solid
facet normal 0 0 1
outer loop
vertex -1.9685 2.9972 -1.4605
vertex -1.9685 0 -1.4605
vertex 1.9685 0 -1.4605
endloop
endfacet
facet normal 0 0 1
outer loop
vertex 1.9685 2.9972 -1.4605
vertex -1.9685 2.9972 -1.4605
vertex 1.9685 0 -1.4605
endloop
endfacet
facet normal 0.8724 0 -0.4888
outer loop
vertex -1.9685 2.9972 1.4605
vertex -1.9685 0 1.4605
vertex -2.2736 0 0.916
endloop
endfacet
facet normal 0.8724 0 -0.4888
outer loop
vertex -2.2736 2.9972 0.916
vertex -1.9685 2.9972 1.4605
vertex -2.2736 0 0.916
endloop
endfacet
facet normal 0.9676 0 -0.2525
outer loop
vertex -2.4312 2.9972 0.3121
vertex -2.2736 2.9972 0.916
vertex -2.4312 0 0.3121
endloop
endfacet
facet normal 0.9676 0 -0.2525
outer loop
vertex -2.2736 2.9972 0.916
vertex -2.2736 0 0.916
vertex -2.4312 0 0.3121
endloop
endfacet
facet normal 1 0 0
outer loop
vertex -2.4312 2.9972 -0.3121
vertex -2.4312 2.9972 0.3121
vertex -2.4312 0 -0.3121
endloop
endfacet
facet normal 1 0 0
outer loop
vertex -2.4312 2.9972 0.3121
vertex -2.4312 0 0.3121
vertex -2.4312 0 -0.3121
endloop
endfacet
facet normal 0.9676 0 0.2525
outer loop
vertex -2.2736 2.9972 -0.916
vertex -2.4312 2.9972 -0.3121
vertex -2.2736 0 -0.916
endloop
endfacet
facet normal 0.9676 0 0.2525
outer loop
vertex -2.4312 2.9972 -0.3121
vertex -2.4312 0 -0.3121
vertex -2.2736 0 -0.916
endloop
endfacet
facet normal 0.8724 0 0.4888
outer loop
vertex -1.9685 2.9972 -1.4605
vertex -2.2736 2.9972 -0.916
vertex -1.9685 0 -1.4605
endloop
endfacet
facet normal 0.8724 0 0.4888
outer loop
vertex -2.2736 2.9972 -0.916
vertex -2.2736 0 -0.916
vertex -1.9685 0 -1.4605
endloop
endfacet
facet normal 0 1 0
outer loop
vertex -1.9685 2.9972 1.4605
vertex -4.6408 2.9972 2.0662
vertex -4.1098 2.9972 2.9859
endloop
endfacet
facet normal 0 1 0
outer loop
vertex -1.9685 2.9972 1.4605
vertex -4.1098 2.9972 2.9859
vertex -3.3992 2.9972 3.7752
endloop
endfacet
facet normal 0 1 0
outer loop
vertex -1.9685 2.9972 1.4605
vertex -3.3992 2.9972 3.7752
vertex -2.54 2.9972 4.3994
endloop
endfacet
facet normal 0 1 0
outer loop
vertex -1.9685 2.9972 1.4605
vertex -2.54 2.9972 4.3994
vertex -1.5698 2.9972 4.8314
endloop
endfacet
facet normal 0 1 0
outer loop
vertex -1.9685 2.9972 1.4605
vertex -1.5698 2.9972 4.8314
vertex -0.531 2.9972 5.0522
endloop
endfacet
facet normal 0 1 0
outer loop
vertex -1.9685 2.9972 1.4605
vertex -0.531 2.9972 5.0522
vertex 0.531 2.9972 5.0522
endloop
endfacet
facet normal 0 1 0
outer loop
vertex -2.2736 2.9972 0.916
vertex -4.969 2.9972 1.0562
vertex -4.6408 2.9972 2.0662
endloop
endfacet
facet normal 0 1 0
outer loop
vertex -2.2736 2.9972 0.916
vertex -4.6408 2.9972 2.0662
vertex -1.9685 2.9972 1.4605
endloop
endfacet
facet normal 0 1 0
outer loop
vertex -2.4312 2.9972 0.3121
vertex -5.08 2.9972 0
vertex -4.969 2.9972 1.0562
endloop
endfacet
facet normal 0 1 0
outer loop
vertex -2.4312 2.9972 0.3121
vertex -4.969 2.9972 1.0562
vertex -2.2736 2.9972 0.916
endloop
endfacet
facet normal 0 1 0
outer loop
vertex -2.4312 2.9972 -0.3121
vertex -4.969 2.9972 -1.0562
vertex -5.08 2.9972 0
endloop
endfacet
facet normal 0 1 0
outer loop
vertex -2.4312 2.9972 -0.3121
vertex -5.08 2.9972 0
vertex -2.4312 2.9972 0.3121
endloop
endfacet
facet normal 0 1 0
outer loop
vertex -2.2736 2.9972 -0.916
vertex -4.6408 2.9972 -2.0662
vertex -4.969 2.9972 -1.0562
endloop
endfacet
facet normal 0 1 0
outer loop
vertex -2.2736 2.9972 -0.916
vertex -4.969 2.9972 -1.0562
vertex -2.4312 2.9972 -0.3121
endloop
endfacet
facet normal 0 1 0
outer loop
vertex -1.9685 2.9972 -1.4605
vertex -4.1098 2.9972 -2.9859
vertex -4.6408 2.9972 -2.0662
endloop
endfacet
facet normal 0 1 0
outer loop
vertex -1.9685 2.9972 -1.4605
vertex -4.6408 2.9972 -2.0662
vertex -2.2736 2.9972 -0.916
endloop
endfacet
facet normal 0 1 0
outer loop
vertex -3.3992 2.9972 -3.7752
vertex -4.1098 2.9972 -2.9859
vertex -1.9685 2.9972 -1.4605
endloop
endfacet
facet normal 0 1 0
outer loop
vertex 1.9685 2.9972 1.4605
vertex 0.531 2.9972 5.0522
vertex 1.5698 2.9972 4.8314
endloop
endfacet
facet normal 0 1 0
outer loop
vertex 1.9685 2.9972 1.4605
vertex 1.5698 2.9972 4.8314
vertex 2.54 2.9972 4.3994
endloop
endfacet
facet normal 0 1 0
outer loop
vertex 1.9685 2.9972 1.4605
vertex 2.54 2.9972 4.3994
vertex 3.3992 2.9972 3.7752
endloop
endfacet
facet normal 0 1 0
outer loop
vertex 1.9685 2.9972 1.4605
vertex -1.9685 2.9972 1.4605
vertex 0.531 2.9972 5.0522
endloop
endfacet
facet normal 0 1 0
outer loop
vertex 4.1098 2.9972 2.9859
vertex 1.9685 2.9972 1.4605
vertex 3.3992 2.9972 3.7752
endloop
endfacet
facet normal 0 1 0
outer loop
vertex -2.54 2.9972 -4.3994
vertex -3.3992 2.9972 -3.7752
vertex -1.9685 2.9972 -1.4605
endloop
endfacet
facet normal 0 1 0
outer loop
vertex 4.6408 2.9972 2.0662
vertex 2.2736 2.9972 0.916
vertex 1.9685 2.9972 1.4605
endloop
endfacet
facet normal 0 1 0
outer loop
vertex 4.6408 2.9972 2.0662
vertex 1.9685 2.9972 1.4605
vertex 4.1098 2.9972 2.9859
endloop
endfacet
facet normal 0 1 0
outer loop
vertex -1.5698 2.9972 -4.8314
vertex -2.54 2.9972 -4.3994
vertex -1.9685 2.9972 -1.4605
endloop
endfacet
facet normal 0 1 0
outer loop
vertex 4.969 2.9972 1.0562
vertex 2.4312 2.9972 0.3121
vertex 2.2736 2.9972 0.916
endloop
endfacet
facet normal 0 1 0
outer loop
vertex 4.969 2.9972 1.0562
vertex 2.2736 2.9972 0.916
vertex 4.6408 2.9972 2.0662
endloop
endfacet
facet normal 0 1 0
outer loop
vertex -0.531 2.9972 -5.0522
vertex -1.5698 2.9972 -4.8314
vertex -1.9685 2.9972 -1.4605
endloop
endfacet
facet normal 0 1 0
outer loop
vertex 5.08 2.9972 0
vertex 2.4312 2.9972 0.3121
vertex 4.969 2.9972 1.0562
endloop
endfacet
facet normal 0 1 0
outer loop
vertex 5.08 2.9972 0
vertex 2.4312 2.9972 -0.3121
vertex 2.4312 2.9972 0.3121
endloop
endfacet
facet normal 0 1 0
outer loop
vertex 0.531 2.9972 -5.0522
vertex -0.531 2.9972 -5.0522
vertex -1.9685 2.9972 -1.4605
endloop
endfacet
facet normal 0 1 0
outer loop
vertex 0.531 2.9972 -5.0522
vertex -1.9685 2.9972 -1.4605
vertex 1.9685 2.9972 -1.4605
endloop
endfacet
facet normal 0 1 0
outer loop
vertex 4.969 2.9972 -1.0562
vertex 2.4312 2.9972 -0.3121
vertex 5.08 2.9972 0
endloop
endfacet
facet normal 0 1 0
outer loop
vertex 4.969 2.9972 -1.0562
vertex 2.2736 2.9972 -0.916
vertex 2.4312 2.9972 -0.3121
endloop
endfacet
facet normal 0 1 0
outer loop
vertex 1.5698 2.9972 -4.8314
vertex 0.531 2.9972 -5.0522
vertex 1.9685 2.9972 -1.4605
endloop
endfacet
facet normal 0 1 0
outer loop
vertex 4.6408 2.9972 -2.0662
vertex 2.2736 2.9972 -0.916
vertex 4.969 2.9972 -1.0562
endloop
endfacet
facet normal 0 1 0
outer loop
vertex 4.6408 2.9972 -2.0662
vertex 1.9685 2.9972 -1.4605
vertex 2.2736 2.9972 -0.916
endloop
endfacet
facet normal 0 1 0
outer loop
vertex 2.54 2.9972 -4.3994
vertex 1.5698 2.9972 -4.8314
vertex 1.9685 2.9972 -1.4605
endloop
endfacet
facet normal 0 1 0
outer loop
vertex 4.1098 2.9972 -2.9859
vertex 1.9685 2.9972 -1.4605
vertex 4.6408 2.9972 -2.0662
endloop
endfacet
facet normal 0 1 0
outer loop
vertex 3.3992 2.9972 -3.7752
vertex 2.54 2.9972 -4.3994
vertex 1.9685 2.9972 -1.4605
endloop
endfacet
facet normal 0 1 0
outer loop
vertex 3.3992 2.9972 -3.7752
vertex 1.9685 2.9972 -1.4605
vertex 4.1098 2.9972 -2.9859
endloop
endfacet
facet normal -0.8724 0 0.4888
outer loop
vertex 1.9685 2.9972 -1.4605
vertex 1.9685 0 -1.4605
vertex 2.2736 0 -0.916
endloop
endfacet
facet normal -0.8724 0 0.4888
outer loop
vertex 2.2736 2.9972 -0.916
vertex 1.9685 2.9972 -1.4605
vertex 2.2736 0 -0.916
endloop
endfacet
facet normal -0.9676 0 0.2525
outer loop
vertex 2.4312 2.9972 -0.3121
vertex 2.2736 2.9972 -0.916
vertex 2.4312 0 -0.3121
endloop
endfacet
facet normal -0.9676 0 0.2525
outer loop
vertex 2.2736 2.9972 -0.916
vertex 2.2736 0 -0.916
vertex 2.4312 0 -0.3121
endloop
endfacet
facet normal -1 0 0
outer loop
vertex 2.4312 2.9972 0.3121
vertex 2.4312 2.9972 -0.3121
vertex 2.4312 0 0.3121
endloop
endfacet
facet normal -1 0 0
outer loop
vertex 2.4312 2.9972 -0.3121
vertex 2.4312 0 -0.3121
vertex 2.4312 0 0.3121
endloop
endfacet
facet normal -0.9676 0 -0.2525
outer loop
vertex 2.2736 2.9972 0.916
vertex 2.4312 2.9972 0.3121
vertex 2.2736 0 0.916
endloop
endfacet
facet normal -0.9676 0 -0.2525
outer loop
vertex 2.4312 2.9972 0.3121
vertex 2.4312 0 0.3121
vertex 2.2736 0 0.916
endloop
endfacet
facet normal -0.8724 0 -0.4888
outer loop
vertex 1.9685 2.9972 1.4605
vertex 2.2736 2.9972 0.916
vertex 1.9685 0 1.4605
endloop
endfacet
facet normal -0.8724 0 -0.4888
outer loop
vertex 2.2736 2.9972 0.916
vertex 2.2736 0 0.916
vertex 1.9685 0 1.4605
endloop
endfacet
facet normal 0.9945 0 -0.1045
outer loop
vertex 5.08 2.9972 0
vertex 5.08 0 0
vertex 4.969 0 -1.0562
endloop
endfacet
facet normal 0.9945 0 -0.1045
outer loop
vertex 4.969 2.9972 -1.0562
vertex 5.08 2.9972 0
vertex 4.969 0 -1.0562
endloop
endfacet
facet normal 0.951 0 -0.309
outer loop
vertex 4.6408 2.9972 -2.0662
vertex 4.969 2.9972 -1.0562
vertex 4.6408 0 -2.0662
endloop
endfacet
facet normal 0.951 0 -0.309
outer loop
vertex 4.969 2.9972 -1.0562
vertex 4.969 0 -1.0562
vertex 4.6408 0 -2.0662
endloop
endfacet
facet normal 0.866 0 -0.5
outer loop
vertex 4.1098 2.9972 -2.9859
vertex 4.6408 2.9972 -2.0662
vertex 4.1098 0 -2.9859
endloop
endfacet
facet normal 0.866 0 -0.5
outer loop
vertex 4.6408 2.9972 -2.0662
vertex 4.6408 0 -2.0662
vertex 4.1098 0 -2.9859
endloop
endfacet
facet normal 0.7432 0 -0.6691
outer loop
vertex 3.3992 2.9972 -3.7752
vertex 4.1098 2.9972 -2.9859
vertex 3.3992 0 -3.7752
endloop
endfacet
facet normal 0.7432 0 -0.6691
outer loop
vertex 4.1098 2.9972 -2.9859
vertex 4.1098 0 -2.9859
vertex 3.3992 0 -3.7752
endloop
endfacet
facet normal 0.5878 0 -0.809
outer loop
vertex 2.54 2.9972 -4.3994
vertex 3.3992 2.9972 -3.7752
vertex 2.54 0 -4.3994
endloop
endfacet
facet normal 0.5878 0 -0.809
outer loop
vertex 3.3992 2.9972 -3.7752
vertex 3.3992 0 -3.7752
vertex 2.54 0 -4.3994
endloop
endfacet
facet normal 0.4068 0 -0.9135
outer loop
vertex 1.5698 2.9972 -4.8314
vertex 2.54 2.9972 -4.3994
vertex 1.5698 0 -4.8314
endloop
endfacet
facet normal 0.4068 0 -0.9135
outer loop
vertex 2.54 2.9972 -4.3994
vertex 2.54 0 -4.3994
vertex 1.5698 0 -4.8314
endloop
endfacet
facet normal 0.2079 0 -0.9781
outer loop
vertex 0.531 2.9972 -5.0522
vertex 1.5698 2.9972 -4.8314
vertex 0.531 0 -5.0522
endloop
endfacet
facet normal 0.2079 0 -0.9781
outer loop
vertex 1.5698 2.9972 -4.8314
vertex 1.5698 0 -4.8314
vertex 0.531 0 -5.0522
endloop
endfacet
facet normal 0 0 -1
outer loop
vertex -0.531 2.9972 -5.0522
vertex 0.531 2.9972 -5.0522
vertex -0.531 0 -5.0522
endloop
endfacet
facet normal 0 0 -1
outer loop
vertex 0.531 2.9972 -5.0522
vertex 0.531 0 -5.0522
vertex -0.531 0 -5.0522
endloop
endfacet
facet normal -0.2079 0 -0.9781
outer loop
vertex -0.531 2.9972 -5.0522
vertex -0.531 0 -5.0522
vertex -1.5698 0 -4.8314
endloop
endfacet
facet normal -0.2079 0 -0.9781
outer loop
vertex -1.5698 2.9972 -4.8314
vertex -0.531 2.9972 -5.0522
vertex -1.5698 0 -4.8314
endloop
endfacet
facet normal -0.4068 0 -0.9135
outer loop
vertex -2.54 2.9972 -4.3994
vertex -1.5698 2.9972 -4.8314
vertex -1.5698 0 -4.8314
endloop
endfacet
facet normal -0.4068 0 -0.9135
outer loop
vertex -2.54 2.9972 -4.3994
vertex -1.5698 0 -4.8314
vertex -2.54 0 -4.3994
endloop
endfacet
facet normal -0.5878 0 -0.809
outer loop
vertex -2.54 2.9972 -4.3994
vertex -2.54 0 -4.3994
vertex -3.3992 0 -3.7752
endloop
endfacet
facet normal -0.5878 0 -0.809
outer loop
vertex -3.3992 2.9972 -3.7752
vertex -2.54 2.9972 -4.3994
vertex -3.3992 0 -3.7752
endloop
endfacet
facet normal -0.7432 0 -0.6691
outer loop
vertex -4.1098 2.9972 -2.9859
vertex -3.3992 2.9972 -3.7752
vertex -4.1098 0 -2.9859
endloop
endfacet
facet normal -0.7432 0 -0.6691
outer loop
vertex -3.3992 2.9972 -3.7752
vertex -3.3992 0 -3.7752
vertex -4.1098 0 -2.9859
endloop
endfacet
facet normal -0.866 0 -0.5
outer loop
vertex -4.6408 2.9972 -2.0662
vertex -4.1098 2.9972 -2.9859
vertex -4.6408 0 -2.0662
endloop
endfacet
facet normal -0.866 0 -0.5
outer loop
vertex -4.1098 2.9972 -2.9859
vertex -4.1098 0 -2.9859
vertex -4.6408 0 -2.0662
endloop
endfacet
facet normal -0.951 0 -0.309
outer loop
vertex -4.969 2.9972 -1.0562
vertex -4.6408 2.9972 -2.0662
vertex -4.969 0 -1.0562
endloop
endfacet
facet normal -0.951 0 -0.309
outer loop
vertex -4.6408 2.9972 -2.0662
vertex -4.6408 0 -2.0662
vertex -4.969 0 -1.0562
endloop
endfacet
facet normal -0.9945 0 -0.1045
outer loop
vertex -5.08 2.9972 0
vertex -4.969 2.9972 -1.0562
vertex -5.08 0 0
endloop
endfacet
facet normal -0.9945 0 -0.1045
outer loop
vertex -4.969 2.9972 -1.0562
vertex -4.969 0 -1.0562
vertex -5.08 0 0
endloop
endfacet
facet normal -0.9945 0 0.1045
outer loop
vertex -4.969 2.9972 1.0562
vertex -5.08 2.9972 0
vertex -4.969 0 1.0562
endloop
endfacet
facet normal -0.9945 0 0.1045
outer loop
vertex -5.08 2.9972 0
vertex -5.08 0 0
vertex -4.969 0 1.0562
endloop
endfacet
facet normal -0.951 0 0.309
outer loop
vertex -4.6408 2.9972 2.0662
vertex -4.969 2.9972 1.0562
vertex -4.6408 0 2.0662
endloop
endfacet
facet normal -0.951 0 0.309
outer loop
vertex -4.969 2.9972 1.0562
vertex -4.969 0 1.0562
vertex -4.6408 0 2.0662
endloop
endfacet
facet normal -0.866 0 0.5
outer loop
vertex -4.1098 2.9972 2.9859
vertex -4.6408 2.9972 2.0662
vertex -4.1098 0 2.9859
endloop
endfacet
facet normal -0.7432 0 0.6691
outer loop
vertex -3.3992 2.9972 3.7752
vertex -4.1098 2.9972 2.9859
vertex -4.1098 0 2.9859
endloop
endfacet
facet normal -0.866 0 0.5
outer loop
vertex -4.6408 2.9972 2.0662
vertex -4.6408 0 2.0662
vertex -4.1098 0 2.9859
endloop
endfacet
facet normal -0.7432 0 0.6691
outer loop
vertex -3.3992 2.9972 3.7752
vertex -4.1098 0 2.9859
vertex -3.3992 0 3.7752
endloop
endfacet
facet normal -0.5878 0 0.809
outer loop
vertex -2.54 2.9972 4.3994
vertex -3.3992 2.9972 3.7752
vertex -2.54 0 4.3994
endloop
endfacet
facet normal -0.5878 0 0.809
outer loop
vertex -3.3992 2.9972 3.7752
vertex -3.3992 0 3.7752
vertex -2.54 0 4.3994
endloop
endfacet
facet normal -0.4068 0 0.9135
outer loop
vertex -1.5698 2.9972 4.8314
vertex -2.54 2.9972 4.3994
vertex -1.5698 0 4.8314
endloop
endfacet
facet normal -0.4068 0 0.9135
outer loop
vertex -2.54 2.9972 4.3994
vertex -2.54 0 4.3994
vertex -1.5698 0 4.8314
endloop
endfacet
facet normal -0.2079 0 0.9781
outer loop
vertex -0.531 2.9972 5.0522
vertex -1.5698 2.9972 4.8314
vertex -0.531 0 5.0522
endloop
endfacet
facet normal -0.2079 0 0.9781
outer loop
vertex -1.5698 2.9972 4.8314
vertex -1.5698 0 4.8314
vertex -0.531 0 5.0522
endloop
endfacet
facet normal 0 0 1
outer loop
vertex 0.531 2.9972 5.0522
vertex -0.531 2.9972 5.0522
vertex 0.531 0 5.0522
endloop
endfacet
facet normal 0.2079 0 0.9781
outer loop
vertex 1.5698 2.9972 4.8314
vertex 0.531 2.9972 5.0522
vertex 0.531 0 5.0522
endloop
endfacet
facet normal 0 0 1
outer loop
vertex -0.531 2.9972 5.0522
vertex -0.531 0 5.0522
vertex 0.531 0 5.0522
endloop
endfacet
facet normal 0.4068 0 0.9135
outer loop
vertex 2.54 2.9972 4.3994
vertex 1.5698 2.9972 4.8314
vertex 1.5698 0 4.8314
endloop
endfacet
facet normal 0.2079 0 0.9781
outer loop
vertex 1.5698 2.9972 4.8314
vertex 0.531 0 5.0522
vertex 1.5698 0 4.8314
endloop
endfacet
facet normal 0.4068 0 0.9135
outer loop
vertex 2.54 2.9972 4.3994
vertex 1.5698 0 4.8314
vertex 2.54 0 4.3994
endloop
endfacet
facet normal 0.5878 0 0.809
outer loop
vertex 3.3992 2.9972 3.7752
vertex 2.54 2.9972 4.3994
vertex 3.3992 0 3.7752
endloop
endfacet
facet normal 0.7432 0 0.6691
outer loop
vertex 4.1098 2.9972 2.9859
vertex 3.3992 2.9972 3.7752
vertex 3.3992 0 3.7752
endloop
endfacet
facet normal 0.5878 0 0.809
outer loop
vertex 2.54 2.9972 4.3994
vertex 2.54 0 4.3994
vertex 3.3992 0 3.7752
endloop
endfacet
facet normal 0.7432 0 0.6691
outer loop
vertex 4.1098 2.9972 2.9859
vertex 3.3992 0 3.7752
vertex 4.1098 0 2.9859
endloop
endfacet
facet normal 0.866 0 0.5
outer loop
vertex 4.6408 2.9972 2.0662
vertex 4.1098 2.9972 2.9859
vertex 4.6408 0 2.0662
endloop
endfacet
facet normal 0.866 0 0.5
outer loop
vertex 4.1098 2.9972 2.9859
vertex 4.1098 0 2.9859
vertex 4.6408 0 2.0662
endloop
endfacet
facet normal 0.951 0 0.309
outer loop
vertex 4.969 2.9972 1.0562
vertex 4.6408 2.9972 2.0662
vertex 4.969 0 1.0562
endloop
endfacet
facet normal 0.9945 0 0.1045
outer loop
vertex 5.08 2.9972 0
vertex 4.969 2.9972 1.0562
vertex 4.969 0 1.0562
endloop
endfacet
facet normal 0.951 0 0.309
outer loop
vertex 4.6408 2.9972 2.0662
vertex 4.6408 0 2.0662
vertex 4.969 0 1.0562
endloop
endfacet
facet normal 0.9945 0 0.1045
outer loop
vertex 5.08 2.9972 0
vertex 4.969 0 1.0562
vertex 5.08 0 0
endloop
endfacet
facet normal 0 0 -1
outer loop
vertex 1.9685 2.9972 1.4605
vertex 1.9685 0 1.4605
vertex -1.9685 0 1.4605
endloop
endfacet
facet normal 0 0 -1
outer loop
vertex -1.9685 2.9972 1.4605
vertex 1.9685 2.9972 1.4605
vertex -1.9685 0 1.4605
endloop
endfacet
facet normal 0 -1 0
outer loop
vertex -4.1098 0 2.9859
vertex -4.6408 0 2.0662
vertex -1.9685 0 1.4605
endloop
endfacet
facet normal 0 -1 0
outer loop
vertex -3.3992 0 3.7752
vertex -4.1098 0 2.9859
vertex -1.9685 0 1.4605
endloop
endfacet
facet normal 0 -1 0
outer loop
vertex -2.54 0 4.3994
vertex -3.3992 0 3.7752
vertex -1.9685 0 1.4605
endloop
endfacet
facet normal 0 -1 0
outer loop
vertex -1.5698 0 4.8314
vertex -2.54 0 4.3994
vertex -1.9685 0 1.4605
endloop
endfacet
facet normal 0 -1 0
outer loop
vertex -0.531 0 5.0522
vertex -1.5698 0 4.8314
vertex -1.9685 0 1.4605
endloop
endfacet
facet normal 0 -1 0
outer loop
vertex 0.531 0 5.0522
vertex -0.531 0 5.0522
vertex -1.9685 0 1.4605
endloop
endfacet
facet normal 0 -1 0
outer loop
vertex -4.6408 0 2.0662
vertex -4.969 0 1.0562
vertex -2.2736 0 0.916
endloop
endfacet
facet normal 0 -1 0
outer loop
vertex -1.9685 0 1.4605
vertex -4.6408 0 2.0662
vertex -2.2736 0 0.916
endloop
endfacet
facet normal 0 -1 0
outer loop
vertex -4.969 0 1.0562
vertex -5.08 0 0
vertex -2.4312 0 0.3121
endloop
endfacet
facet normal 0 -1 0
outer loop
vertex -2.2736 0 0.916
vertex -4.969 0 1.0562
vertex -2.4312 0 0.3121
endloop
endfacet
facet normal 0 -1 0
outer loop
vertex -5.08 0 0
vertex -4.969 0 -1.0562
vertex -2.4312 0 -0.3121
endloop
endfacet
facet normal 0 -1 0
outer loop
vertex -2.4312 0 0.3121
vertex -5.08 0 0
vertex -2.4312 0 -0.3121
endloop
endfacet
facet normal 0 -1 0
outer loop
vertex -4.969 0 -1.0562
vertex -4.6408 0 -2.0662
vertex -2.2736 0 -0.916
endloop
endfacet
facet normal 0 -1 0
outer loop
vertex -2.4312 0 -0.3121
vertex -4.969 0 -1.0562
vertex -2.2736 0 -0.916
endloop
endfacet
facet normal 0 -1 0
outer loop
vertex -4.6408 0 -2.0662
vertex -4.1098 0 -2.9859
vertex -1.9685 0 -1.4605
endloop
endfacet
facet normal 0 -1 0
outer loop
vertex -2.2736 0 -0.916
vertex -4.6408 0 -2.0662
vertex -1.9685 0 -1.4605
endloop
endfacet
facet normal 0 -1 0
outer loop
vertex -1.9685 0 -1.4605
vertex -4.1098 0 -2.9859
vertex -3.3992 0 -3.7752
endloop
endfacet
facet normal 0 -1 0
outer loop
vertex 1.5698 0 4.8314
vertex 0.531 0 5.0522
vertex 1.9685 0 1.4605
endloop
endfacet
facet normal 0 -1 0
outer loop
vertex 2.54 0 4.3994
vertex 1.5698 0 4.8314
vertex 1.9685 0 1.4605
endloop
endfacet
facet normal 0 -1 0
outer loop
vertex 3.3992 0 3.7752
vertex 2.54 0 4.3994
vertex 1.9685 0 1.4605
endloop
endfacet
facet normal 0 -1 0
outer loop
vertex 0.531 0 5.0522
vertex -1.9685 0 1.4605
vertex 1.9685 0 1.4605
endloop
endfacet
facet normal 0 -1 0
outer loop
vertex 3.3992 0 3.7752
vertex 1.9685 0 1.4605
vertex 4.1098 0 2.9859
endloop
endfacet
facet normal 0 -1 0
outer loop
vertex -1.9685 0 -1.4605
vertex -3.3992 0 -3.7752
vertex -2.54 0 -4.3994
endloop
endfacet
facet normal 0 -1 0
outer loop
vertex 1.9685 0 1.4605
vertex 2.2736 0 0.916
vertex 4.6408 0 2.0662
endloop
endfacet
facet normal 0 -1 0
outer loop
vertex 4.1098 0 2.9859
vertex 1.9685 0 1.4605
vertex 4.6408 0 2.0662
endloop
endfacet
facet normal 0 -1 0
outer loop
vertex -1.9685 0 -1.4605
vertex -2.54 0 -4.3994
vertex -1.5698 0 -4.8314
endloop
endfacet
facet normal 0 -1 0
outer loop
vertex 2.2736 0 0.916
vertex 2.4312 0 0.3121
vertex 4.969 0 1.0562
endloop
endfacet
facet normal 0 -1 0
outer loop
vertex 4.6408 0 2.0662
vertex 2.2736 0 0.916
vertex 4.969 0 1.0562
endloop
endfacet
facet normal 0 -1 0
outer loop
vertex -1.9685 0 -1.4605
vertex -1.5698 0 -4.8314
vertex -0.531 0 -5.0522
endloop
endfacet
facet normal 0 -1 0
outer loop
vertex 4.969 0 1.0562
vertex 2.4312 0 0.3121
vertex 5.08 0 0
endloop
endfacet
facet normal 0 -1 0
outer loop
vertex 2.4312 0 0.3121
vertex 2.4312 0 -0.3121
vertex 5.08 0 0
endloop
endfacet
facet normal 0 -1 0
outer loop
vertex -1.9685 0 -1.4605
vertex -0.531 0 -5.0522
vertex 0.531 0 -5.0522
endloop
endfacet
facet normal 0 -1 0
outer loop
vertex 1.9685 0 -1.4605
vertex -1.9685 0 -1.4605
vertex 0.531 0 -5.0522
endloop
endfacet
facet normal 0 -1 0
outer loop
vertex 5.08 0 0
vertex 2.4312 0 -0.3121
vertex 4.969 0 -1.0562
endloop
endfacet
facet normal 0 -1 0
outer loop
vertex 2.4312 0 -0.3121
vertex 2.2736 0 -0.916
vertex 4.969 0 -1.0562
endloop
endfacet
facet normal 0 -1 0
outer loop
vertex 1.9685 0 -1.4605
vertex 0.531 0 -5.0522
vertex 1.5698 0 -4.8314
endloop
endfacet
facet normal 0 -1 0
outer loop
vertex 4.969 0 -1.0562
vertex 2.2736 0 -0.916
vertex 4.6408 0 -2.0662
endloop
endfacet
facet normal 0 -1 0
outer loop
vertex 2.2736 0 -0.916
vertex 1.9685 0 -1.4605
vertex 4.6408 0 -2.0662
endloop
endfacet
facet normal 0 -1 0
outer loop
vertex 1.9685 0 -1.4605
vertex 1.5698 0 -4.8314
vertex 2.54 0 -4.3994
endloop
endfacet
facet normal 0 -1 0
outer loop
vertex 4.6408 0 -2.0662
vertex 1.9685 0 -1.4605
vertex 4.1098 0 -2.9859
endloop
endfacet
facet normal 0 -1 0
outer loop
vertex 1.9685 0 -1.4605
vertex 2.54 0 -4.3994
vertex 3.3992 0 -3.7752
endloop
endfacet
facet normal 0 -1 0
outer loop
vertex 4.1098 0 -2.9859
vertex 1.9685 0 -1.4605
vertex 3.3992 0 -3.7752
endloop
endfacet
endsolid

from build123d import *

# Parameters (mm, degrees)
SKETCH1_R           = 5.08
BOSS_EXTRUDE1_DEPTH = 2.9972


with BuildPart() as part:
    # Sketch1 → Boss-Extrude1 (new body)
    with BuildSketch(Plane(origin=(0, 0, 0), x_dir=(1, 0, 0), z_dir=(0, 1, 0))):
        Circle(SKETCH1_R)
        with BuildLine():
            Line((-1.9685, 1.4605), (1.9685, 1.4605))
            ThreePointArc((1.9685, 1.4605), (2.451132901, 0), (1.9685, -1.4605))
            Line((1.9685, -1.4605), (-1.9685, -1.4605))
            ThreePointArc((-1.9685, -1.4605), (-2.451132901, 0), (-1.9685, 1.4605))
        make_face(mode=Mode.SUBTRACT)
    extrude(amount=BOSS_EXTRUDE1_DEPTH)


solid = part.part
